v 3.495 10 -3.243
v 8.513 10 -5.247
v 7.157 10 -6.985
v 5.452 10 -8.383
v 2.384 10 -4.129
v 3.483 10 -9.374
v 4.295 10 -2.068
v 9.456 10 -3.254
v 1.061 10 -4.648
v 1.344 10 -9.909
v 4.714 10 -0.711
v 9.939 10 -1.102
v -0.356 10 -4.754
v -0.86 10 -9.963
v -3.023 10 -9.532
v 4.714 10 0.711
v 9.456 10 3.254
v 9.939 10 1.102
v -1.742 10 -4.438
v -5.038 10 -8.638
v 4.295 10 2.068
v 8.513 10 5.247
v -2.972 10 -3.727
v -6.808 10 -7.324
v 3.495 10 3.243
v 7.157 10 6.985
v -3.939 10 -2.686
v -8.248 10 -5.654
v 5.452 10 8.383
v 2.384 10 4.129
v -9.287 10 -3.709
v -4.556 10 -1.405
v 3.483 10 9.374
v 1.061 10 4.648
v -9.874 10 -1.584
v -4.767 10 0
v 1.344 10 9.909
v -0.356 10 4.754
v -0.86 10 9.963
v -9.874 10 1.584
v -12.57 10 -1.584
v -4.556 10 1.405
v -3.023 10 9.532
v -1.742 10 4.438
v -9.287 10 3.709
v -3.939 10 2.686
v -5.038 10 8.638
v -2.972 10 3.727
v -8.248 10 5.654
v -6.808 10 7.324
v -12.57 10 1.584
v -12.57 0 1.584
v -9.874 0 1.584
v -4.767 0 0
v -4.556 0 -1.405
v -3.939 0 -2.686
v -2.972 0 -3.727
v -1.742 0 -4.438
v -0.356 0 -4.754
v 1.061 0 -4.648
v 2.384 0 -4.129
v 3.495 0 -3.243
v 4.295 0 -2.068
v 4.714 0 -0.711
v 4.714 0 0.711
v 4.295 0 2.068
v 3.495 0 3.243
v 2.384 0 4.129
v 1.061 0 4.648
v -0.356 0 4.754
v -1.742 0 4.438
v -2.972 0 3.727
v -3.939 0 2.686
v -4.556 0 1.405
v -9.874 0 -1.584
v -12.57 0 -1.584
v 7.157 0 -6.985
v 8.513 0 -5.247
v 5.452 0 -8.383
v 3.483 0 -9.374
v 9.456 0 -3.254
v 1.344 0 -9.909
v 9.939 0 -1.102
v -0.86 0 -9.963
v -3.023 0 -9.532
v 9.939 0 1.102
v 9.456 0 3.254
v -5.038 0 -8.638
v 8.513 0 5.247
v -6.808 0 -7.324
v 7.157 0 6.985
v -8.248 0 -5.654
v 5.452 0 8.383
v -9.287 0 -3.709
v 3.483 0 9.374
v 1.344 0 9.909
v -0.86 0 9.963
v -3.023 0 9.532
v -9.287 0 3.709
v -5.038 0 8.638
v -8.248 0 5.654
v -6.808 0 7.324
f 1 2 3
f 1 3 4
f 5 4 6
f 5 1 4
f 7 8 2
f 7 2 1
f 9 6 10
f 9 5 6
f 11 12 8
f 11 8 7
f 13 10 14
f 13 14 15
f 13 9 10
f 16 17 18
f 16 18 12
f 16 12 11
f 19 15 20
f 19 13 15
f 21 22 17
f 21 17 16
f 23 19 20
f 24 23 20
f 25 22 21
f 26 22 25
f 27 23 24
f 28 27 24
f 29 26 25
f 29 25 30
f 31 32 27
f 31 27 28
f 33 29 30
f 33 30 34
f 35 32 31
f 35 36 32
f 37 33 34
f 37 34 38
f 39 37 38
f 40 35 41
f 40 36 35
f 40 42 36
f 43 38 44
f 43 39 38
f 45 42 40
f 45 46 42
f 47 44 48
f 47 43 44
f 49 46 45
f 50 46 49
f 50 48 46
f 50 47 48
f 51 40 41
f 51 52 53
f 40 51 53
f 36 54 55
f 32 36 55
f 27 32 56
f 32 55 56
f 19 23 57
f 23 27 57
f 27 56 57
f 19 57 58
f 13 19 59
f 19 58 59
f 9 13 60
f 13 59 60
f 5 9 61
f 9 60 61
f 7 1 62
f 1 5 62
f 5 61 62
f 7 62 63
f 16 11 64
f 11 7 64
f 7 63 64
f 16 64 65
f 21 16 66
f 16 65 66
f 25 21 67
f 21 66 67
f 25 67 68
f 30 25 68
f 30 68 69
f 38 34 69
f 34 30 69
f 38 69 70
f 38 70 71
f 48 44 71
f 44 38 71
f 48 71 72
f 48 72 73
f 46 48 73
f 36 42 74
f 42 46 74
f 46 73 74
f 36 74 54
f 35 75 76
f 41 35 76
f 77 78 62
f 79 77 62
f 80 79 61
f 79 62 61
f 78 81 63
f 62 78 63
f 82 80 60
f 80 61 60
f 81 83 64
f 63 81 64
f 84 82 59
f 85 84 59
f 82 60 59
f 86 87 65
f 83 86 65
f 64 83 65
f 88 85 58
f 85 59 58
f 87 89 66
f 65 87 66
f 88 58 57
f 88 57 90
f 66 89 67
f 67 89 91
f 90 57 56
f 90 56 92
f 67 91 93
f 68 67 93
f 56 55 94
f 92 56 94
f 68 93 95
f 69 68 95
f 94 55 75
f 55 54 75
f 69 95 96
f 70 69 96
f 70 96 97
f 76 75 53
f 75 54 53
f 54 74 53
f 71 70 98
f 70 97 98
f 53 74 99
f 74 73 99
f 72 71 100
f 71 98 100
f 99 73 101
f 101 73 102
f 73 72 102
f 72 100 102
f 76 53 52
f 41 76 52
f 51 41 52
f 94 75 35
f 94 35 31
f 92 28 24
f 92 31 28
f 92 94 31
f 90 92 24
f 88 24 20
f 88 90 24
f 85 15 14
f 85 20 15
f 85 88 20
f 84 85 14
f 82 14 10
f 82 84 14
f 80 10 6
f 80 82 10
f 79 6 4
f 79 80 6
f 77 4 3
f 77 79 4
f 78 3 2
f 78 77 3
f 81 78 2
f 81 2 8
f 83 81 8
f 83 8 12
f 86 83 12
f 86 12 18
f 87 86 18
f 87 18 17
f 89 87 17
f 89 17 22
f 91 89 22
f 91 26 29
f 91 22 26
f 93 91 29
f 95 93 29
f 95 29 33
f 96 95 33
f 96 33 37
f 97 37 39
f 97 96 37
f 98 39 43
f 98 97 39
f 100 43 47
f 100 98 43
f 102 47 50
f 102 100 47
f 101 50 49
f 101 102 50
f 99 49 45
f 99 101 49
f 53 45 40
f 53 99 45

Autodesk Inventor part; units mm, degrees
ref_plane "YZ Plane" through (0, 0, 0) normal (1, 0, 0) x (0, 1, 0)
ref_plane "XZ Plane" through (0, 0, 0) normal (0, 1, 0) x (-1, 0, 0)
sketch "Sketch1" plane through (0, 0, 0) normal (0, 1, 0) x (-1, 0, 0)
  circle A0 centre (0, 0) radius 4.7674
  circle A1 centre (0, 0) radius 10
  line L0 (9.8737, 1.5843) -> (9.8737, -1.5843)
  line L1 (9.8737, -1.5843) -> (12.5697, -1.5843)
  line L2 (12.5697, -1.5843) -> (12.5697, 1.5843)
  line L3 (12.5697, 1.5843) -> (9.8737, 1.5843)
  dimension "d0" = 20
  dimension "d1" = 9.5349
extrude "Extrusion1" add sketch "Sketch1" along normal blind 10
properties part number "Test_gear_p1"
